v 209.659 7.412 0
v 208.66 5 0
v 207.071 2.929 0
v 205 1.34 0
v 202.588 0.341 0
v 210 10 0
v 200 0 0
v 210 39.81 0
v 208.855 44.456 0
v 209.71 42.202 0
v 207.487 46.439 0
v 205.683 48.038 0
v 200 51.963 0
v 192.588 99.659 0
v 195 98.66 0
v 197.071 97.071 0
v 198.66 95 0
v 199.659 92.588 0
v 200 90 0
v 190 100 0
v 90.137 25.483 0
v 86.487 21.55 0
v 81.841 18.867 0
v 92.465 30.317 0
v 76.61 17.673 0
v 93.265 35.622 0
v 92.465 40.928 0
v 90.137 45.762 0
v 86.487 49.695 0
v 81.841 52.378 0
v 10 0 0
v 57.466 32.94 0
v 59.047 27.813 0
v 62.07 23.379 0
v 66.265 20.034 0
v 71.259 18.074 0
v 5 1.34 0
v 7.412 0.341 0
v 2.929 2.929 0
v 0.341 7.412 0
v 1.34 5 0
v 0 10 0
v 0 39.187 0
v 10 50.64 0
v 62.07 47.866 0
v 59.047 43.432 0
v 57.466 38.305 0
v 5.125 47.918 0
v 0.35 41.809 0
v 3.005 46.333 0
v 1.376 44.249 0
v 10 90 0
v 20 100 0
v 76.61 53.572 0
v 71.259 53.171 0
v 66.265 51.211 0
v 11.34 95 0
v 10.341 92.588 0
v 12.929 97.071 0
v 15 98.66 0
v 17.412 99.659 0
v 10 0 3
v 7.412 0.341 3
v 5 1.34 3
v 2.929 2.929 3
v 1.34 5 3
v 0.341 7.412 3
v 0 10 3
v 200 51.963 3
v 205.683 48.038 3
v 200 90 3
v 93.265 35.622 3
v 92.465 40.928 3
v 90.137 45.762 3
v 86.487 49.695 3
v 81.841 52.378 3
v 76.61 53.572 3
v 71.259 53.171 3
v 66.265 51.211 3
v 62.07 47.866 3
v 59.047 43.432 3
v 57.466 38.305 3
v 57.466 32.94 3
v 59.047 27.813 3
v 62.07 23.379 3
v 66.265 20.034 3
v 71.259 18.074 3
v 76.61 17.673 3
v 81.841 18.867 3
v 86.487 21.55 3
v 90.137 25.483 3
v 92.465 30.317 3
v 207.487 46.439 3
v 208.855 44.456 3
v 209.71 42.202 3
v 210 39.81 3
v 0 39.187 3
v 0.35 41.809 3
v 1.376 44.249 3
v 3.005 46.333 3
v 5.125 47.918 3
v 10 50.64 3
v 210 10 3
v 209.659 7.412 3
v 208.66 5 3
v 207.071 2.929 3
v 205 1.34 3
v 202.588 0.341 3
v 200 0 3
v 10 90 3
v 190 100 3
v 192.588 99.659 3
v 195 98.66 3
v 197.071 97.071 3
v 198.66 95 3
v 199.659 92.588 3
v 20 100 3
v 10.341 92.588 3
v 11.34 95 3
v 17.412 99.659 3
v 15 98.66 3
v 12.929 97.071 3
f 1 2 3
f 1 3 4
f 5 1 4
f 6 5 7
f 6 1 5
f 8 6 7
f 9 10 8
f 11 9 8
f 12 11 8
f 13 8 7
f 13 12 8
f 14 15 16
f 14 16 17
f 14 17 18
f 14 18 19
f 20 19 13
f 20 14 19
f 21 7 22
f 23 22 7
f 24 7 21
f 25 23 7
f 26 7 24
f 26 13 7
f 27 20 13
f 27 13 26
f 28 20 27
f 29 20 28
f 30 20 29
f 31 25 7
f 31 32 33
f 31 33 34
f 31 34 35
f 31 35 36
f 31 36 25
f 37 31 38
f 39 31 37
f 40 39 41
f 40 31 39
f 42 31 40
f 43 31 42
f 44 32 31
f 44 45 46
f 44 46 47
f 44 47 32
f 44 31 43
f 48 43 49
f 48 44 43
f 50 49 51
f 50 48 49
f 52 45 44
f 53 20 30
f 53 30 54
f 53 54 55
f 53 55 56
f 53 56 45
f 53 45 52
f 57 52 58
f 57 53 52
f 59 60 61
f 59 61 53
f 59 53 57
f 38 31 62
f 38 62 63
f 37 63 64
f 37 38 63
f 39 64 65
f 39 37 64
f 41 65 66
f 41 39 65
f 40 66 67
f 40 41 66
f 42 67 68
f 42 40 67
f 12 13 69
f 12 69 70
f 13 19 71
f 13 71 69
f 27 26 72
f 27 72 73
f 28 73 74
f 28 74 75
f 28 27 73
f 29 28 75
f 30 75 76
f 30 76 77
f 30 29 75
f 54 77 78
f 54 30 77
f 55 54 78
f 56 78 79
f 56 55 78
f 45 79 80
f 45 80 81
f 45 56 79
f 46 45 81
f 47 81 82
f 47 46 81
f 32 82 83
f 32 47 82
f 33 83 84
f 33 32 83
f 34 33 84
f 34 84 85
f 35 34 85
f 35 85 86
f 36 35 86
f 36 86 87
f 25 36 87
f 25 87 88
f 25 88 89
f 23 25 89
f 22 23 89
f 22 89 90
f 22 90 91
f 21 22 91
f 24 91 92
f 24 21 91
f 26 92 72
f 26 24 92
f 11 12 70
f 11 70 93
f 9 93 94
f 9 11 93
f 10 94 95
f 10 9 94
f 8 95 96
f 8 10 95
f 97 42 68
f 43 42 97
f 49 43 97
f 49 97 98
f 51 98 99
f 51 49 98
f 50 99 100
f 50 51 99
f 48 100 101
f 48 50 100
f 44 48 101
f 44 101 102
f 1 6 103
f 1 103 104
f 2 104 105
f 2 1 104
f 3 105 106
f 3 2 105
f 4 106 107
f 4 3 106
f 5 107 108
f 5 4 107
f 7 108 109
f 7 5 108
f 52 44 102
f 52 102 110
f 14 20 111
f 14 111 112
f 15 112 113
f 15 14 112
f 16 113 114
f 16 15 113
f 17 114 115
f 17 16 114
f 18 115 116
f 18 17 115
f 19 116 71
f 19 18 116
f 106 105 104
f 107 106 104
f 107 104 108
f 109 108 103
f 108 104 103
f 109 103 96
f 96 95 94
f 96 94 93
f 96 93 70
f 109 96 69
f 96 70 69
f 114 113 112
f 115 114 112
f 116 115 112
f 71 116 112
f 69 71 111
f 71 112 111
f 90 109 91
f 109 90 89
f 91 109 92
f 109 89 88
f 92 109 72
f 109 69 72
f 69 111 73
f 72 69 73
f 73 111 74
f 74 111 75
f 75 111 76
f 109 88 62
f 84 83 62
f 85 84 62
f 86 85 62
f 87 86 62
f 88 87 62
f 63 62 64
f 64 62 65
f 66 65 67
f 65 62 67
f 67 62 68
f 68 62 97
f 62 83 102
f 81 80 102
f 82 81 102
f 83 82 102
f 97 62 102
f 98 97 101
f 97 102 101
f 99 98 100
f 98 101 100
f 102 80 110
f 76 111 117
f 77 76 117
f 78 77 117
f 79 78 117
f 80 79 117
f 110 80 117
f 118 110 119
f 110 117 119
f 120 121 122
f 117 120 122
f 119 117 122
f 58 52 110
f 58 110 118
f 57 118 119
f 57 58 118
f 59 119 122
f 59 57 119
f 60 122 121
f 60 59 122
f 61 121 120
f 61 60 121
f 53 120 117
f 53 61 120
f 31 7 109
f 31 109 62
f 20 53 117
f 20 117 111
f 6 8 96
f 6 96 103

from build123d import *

# Parameters (mm, degrees)
SKETCH_1_R      = 18
EXTRUDE_1_DEPTH = 3


with BuildPart() as part:
    # 草图1 → 凸台-拉伸1 (new body)
    with BuildSketch(Plane.XY):
        with BuildLine():
            Line((0, 10), (0, 39.186569494))
            ThreePointArc((0, 39.186569494), (1.375838219, 44.248568464), (5.124766715, 47.917669105))
            Line((5.124766715, 47.917669105), (10, 50.639880584))
            Line((10, 50.639880584), (10, 90))
            ThreePointArc((10, 90), (12.928932188, 97.071067812), (20, 100))
            Line((20, 100), (190, 100))
            ThreePointArc((190, 100), (197.071067812, 97.071067812), (200, 90))
            Line((200, 90), (200, 51.963395008))
            Line((200, 51.963395008), (205.683304945, 48.037782396))
            ThreePointArc((205.683304945, 48.037782396), (208.855310538, 44.455580593), (210, 39.809778695))
            Line((210, 39.809778695), (210, 10))
            ThreePointArc((210, 10), (207.071067812, 2.928932188), (200, 0))
            Line((200, 0), (10, 0))
            ThreePointArc((10, 0), (2.928932188, 2.928932188), (0, 10))
        make_face()
        with Locations((75.264593403, 35.622477185)):
            Circle(SKETCH_1_R, mode=Mode.SUBTRACT)
    extrude(amount=EXTRUDE_1_DEPTH)


solid = part.part
